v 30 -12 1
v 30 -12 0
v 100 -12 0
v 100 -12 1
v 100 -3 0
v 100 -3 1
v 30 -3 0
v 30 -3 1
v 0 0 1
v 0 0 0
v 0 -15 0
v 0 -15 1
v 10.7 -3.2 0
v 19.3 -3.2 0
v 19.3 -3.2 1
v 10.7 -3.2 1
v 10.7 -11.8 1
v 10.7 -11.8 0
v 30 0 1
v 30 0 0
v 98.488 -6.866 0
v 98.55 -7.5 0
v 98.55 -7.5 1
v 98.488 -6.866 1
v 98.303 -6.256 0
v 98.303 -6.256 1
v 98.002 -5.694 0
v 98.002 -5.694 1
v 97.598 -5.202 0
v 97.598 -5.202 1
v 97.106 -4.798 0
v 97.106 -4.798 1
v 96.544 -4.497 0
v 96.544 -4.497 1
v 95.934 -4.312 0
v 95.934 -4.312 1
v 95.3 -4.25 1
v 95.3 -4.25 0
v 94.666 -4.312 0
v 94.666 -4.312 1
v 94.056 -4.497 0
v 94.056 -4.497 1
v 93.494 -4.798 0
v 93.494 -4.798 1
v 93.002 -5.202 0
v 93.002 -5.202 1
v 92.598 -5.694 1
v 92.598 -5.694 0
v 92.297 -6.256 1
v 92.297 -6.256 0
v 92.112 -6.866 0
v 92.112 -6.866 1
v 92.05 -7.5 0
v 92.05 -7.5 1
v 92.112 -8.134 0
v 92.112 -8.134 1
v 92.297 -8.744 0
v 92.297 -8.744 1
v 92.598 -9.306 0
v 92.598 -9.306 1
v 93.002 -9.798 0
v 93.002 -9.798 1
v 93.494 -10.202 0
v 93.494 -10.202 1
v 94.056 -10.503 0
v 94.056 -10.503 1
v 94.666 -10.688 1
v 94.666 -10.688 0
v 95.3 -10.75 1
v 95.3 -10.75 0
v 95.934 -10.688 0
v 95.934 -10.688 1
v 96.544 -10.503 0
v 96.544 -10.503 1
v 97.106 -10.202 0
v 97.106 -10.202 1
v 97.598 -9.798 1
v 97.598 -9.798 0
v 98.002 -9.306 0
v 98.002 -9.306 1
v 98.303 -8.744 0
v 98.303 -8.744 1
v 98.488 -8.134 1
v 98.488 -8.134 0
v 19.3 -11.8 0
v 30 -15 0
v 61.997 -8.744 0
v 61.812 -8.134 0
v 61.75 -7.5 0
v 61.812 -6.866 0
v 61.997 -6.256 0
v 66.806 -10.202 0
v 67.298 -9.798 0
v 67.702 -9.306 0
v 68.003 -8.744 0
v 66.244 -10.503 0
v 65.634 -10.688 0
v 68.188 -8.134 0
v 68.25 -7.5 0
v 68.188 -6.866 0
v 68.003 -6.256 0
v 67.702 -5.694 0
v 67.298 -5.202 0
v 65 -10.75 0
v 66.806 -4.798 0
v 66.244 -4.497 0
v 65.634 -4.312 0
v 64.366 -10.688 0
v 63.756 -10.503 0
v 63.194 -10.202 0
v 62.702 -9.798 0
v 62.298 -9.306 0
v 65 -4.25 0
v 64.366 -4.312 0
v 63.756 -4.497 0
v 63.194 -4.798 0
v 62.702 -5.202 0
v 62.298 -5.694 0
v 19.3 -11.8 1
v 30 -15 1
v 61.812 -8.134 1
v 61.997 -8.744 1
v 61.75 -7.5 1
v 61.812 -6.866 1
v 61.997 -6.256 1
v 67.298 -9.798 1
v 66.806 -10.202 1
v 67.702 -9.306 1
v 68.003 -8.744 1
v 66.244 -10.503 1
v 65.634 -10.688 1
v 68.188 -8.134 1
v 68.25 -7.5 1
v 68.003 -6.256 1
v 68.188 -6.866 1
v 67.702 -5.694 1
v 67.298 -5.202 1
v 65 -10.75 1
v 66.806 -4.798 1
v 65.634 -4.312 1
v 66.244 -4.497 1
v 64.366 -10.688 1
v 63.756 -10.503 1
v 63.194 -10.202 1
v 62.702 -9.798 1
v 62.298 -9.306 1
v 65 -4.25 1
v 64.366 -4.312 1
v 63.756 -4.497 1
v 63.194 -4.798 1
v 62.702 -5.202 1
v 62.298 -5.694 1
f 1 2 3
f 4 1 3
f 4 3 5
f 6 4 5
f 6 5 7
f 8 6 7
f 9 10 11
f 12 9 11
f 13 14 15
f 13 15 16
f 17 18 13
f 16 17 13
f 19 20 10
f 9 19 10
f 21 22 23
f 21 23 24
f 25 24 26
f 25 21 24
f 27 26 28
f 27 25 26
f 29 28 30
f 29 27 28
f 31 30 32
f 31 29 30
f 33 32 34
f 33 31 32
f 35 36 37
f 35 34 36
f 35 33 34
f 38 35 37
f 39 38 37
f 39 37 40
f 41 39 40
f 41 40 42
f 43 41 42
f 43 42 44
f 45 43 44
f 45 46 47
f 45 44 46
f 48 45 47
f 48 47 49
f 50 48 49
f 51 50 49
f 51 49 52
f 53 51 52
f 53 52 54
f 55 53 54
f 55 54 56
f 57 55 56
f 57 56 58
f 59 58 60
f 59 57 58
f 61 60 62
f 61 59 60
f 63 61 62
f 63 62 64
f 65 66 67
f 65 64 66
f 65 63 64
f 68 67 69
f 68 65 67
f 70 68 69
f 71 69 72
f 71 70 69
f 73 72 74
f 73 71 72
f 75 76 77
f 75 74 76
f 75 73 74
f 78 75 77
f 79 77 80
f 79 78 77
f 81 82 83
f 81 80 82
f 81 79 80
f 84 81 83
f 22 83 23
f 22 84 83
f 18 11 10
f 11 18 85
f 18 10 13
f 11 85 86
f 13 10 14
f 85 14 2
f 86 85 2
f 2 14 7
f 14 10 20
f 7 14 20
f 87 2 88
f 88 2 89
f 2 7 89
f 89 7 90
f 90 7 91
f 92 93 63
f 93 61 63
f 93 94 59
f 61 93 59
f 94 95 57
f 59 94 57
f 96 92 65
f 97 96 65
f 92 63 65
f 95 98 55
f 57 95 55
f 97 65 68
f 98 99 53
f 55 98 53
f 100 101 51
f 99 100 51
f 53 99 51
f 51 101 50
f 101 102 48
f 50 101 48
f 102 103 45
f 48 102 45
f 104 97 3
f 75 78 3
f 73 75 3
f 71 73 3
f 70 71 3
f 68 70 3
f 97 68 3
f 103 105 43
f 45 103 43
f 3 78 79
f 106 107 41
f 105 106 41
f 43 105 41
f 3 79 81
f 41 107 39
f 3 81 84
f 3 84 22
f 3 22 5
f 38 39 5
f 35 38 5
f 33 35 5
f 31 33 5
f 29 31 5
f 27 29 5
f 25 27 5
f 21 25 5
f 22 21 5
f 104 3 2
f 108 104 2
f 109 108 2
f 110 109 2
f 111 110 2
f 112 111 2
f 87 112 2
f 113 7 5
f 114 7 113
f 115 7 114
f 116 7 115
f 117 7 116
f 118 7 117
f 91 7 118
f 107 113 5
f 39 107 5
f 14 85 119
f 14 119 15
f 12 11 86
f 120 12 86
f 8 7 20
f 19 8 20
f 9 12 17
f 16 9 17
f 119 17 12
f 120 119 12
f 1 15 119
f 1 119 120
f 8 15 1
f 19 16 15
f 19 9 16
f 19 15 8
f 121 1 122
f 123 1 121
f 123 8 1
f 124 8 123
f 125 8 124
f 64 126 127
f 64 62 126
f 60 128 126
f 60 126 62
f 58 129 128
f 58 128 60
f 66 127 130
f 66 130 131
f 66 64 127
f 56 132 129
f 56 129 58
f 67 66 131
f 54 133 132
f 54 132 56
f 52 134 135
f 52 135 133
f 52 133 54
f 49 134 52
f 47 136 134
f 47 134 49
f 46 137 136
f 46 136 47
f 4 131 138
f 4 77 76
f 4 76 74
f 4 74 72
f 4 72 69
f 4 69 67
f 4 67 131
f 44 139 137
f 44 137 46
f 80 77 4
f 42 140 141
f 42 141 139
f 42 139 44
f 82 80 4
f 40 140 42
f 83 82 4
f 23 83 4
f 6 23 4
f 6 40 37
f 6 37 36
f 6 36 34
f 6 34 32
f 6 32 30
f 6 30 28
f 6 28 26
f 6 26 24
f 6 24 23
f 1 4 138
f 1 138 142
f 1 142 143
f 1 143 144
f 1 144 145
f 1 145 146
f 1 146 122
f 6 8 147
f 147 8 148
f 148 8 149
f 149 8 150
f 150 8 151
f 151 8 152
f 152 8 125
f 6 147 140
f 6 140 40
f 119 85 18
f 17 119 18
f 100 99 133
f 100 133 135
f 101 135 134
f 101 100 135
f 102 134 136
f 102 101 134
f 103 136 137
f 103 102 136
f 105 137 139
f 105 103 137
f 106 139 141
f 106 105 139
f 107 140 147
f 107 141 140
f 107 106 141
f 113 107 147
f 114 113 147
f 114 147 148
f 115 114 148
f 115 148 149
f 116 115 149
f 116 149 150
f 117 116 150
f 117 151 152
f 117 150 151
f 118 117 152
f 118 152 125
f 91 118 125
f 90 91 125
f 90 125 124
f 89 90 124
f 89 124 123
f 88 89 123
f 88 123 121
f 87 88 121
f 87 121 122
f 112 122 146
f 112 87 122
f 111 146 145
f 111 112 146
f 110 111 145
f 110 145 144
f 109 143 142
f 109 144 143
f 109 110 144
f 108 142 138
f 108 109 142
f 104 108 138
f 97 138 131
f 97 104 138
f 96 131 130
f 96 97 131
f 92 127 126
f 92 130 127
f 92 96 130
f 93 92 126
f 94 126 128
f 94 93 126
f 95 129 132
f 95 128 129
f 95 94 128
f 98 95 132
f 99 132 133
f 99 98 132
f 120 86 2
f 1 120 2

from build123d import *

# Parameters (mm, degrees)
BOSS_EXTRUDE1_DEPTH     = 1
SKETCH3_W               = 8.6
SKETCH3_H               = 8.6
CUT_EXTRUDE2_DEPTH      = 102.123686642
CUT_EXTRUDE3_DEPTH      = 102.123686642
CUT_EXTRUDE3_DEPTH_BACK = 102.123686642
SKETCH5_R               = 3.25


with BuildPart() as part:
    # Sketch1 → Boss-Extrude1 (new body)
    with BuildSketch(Plane.XY):
        Polygon((30, -3), (30, 0), (0, 0), (0, -15), (30, -15), (30, -12), (100, -12), (100, -3), align=None)
    extrude(amount=BOSS_EXTRUDE1_DEPTH)

    # Sketch3 → Cut-Extrude2 (cut, through all)
    with BuildSketch(Plane(origin=(0, 0, 0), x_dir=(-1, 0, 0), z_dir=(0, 0, -1))):
        with Locations((-15, -7.5)):
            Rectangle(SKETCH3_W, SKETCH3_H)
    extrude(amount=-CUT_EXTRUDE2_DEPTH, mode=Mode.SUBTRACT)

    # Sketch5 → Cut-Extrude3 (cut, two sides: drawn at the far end of the back side and taken through both)
    with BuildSketch(Plane.XY.offset(1).offset(-CUT_EXTRUDE3_DEPTH_BACK)):
        with Locations((65, -7.5)):
            Circle(SKETCH5_R)
        with Locations((95.3, -7.5)):
            Circle(SKETCH5_R)
    extrude(amount=CUT_EXTRUDE3_DEPTH + CUT_EXTRUDE3_DEPTH_BACK, mode=Mode.SUBTRACT)


solid = part.part
